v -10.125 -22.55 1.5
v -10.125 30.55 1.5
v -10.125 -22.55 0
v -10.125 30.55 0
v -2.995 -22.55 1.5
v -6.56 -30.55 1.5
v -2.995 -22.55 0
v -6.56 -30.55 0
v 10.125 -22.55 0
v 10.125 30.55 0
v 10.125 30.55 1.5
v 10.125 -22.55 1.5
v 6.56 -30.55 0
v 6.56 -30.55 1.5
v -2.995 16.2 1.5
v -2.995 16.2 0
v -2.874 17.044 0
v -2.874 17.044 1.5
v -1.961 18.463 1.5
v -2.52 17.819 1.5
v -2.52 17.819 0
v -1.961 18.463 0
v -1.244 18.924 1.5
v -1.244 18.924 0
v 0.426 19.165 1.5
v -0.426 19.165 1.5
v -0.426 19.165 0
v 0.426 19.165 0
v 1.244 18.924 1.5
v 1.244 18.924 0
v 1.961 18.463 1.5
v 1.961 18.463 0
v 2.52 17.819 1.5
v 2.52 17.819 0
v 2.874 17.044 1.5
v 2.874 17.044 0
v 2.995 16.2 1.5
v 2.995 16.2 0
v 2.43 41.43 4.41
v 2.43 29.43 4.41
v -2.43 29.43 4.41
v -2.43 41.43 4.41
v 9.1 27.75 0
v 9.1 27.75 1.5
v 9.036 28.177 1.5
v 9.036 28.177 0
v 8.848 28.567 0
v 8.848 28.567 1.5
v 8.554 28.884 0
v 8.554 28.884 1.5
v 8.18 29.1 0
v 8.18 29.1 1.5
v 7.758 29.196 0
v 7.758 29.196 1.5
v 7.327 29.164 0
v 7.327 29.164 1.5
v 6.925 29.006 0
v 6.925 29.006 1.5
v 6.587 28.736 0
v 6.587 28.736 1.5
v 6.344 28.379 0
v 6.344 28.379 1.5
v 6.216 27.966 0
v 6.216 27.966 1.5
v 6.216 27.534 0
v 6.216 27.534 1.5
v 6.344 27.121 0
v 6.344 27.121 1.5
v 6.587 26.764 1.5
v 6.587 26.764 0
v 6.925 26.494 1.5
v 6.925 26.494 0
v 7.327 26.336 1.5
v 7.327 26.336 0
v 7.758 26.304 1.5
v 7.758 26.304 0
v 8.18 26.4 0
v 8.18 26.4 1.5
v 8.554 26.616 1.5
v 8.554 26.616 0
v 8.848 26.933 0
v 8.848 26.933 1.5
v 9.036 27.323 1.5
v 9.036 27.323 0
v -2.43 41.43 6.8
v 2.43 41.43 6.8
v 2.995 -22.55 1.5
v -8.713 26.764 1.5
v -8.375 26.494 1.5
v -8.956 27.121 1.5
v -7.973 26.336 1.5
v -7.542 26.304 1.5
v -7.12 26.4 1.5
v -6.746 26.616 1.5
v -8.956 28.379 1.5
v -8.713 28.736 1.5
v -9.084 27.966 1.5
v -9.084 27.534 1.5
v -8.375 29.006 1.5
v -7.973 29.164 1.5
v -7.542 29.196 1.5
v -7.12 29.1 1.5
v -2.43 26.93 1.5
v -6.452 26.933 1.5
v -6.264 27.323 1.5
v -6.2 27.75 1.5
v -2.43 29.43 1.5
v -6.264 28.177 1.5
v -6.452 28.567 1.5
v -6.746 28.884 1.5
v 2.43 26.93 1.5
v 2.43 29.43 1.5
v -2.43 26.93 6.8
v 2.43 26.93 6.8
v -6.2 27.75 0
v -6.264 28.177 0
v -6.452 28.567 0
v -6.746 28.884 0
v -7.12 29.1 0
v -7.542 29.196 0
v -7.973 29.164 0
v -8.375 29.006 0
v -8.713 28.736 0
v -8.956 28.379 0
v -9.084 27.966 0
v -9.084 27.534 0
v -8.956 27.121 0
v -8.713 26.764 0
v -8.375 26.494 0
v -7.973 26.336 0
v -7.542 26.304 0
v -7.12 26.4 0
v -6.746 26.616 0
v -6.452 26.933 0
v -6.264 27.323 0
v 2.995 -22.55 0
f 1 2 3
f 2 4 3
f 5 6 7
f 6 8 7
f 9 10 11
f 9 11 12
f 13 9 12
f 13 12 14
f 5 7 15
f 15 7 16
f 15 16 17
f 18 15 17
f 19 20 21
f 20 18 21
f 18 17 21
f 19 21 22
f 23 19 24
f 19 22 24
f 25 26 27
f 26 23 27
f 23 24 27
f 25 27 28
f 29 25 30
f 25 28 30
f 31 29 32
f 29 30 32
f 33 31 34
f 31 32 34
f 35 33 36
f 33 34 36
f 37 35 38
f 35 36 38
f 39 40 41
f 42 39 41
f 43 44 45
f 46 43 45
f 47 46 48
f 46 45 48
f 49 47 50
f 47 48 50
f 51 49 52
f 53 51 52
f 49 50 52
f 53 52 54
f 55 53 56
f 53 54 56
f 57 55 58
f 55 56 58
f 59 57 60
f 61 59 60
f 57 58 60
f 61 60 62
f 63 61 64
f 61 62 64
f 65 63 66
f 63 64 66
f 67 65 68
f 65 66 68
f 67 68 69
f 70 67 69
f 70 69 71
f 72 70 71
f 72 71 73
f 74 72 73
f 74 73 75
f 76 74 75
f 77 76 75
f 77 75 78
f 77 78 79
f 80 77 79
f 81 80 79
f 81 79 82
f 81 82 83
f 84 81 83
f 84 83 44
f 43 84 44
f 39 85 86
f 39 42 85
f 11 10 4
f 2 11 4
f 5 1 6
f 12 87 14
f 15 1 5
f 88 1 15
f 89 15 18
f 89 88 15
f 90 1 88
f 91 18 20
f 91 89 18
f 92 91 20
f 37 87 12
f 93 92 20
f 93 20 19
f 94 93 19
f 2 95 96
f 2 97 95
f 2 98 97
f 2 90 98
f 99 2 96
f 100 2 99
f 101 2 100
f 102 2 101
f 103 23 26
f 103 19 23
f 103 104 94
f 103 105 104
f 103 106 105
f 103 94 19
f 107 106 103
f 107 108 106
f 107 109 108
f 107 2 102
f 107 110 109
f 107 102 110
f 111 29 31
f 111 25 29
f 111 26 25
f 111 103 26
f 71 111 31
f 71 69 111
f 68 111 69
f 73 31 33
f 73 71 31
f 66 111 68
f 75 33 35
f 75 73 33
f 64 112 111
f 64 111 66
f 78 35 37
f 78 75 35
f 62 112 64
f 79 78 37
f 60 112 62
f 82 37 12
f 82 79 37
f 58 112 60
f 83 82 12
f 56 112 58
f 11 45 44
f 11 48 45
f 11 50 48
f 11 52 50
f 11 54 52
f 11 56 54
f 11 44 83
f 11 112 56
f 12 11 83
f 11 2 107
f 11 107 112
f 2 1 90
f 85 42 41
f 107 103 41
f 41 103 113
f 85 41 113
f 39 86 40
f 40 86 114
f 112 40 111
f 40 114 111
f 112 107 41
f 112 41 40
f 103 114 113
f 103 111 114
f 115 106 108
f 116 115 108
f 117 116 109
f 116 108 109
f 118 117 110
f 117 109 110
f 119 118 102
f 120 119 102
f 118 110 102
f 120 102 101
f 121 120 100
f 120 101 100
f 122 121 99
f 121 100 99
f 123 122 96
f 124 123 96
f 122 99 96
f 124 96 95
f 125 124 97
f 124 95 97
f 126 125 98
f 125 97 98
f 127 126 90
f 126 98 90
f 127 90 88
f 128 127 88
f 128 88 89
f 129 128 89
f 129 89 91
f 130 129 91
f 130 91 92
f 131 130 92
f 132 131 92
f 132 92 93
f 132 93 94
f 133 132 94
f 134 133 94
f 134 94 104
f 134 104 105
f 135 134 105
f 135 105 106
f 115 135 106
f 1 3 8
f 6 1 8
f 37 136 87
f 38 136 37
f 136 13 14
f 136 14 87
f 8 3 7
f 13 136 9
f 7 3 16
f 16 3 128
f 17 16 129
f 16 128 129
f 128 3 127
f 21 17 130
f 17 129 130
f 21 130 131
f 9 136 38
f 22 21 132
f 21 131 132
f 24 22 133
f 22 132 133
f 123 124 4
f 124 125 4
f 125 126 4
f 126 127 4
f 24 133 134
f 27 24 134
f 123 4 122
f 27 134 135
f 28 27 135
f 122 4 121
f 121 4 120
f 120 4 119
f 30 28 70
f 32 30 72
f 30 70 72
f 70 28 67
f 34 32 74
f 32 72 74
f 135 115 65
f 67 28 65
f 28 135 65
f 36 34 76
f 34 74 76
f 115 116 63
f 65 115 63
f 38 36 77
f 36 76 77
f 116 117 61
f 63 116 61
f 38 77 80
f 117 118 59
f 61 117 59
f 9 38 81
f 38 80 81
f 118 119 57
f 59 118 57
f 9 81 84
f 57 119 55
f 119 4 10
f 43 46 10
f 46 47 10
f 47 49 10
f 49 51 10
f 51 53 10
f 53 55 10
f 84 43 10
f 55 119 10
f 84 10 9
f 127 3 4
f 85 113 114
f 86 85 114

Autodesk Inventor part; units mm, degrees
ref_plane "YZ Plane" through (0, 0, 0) normal (1, 0, 0) x (0, 1, 0)
ref_plane "XZ Plane" through (0, 0, 0) normal (0, 1, 0) x (-1, 0, 0)
ref_plane "XY Plane" through (0, 0, 0) normal (0, 0, 1) x (1, 0, 0)
sketch "Sketch1" plane through (0, 0, 0) normal (0, 0, 1) x (1, 0, 0)
  line L0 (-10.125, -30.55) -> (10.125, -30.55) construction
  line L1 (10.125, -30.55) -> (10.125, 30.55) construction
  line L2 (10.125, 30.55) -> (-10.125, 30.55)
  line L3 (-10.125, 30.55) -> (-10.125, -30.55) construction
  line L4 (-10.125, -30.55) -> (10.125, 30.55) construction
  line L5 (10.125, -30.55) -> (-10.125, 30.55) construction
  line L6 (-10.125, 30.55) -> (-10.125, -22.55)
  line L7 (-10.125, -22.55) -> (-6.56, -30.55)
  line L8 (-6.56, -30.55) -> (-2.995, -22.55)
  line L9 (-2.995, -22.55) -> (-2.995, 16.2)
  arc A0 (2.995, 16.2) -> (-2.995, 16.2) centre (0, 16.2) ccw
  line L10 (0, 0) -> (0, 8.9972) construction
  line L11 (10.125, 30.55) -> (10.125, -30.55) construction
  line L12 (10.125, 30.55) -> (10.125, -22.55)
  line L13 (10.125, -22.55) -> (6.56, -30.55)
  line L14 (6.56, -30.55) -> (2.995, -22.55)
  line L15 (2.995, -22.55) -> (2.995, 16.2)
  dimension "d0" = 20.25
  dimension "d1" = 61.1
  dimension "d2" = 8
  dimension "d3" = 3.565
  dimension "d4" = 14.35
extrude "Extrusion1" add sketch "Sketch1" along normal blind 1.5
sketch "Sketch2" plane through (0, 0, 1.5) normal (0, 0, 1) x (1, 0, 0)
  line L0 (-2.43, 29.43) -> (2.43, 29.43)
  line L1 (2.43, 29.43) -> (2.43, 26.93)
  line L2 (2.43, 26.93) -> (-2.43, 26.93)
  line L3 (-2.43, 26.93) -> (-2.43, 29.43)
  line L4 (-2.43, 29.43) -> (2.43, 26.93) construction
  line L5 (2.43, 29.43) -> (-2.43, 26.93) construction
  line L6 (10.125, 30.55) -> (-10.125, 30.55) projected
  point P0 (0, 0)
  point P1 (0, 28.18)
  dimension "d7" = 4.86
  dimension "d8" = 2.5
  dimension "d9" = 1.12
extrude "Extrusion2" add sketch "Sketch2" along normal blind 5.3
sketch "Sketch3" plane through (-2.43, 29.43, 1.5) normal (0, 1, 0) x (1, 0, 0)
  line L0 (0, 0) -> (0, -5.3) projected
  line L1 (0, -5.3) -> (4.86, -5.3)
  line L2 (4.86, -5.3) -> (4.86, -2.91)
  line L3 (4.86, -2.91) -> (0, -2.91)
  line L4 (0, -2.91) -> (0, -5.3)
  line L5 (4.86, 0) -> (4.86, -5.3) projected
  point P0 (2.43, 1.5)
  dimension "d12" = 2.39
extrude "Extrusion3" add sketch "Sketch3" along normal blind 12
sketch "Sketch4" plane through (0, 0, 1.5) normal (0, 0, 1) x (1, 0, 0)
  line L0 (-7.65, 27.75) -> (7.65, 27.75) construction
  circle A0 centre (-7.65, 27.75) radius 1.45
  circle A1 centre (7.65, 27.75) radius 1.45
  line L1 (10.125, 30.55) -> (-10.125, 30.55) projected
  point P0 (0, 0)
  point P1 (0, 27.75)
  point P2 (-7.65, 29.2)
  point P3 (-6.2, 27.75)
  point P4 (6.2, 27.75)
  dimension "d15" = 2.9
  dimension "d16" = 12.4
  dimension "d17" = 1.35
extrude "Extrusion4" cut sketch "Sketch4" against normal through all
properties part number "moist probe"
